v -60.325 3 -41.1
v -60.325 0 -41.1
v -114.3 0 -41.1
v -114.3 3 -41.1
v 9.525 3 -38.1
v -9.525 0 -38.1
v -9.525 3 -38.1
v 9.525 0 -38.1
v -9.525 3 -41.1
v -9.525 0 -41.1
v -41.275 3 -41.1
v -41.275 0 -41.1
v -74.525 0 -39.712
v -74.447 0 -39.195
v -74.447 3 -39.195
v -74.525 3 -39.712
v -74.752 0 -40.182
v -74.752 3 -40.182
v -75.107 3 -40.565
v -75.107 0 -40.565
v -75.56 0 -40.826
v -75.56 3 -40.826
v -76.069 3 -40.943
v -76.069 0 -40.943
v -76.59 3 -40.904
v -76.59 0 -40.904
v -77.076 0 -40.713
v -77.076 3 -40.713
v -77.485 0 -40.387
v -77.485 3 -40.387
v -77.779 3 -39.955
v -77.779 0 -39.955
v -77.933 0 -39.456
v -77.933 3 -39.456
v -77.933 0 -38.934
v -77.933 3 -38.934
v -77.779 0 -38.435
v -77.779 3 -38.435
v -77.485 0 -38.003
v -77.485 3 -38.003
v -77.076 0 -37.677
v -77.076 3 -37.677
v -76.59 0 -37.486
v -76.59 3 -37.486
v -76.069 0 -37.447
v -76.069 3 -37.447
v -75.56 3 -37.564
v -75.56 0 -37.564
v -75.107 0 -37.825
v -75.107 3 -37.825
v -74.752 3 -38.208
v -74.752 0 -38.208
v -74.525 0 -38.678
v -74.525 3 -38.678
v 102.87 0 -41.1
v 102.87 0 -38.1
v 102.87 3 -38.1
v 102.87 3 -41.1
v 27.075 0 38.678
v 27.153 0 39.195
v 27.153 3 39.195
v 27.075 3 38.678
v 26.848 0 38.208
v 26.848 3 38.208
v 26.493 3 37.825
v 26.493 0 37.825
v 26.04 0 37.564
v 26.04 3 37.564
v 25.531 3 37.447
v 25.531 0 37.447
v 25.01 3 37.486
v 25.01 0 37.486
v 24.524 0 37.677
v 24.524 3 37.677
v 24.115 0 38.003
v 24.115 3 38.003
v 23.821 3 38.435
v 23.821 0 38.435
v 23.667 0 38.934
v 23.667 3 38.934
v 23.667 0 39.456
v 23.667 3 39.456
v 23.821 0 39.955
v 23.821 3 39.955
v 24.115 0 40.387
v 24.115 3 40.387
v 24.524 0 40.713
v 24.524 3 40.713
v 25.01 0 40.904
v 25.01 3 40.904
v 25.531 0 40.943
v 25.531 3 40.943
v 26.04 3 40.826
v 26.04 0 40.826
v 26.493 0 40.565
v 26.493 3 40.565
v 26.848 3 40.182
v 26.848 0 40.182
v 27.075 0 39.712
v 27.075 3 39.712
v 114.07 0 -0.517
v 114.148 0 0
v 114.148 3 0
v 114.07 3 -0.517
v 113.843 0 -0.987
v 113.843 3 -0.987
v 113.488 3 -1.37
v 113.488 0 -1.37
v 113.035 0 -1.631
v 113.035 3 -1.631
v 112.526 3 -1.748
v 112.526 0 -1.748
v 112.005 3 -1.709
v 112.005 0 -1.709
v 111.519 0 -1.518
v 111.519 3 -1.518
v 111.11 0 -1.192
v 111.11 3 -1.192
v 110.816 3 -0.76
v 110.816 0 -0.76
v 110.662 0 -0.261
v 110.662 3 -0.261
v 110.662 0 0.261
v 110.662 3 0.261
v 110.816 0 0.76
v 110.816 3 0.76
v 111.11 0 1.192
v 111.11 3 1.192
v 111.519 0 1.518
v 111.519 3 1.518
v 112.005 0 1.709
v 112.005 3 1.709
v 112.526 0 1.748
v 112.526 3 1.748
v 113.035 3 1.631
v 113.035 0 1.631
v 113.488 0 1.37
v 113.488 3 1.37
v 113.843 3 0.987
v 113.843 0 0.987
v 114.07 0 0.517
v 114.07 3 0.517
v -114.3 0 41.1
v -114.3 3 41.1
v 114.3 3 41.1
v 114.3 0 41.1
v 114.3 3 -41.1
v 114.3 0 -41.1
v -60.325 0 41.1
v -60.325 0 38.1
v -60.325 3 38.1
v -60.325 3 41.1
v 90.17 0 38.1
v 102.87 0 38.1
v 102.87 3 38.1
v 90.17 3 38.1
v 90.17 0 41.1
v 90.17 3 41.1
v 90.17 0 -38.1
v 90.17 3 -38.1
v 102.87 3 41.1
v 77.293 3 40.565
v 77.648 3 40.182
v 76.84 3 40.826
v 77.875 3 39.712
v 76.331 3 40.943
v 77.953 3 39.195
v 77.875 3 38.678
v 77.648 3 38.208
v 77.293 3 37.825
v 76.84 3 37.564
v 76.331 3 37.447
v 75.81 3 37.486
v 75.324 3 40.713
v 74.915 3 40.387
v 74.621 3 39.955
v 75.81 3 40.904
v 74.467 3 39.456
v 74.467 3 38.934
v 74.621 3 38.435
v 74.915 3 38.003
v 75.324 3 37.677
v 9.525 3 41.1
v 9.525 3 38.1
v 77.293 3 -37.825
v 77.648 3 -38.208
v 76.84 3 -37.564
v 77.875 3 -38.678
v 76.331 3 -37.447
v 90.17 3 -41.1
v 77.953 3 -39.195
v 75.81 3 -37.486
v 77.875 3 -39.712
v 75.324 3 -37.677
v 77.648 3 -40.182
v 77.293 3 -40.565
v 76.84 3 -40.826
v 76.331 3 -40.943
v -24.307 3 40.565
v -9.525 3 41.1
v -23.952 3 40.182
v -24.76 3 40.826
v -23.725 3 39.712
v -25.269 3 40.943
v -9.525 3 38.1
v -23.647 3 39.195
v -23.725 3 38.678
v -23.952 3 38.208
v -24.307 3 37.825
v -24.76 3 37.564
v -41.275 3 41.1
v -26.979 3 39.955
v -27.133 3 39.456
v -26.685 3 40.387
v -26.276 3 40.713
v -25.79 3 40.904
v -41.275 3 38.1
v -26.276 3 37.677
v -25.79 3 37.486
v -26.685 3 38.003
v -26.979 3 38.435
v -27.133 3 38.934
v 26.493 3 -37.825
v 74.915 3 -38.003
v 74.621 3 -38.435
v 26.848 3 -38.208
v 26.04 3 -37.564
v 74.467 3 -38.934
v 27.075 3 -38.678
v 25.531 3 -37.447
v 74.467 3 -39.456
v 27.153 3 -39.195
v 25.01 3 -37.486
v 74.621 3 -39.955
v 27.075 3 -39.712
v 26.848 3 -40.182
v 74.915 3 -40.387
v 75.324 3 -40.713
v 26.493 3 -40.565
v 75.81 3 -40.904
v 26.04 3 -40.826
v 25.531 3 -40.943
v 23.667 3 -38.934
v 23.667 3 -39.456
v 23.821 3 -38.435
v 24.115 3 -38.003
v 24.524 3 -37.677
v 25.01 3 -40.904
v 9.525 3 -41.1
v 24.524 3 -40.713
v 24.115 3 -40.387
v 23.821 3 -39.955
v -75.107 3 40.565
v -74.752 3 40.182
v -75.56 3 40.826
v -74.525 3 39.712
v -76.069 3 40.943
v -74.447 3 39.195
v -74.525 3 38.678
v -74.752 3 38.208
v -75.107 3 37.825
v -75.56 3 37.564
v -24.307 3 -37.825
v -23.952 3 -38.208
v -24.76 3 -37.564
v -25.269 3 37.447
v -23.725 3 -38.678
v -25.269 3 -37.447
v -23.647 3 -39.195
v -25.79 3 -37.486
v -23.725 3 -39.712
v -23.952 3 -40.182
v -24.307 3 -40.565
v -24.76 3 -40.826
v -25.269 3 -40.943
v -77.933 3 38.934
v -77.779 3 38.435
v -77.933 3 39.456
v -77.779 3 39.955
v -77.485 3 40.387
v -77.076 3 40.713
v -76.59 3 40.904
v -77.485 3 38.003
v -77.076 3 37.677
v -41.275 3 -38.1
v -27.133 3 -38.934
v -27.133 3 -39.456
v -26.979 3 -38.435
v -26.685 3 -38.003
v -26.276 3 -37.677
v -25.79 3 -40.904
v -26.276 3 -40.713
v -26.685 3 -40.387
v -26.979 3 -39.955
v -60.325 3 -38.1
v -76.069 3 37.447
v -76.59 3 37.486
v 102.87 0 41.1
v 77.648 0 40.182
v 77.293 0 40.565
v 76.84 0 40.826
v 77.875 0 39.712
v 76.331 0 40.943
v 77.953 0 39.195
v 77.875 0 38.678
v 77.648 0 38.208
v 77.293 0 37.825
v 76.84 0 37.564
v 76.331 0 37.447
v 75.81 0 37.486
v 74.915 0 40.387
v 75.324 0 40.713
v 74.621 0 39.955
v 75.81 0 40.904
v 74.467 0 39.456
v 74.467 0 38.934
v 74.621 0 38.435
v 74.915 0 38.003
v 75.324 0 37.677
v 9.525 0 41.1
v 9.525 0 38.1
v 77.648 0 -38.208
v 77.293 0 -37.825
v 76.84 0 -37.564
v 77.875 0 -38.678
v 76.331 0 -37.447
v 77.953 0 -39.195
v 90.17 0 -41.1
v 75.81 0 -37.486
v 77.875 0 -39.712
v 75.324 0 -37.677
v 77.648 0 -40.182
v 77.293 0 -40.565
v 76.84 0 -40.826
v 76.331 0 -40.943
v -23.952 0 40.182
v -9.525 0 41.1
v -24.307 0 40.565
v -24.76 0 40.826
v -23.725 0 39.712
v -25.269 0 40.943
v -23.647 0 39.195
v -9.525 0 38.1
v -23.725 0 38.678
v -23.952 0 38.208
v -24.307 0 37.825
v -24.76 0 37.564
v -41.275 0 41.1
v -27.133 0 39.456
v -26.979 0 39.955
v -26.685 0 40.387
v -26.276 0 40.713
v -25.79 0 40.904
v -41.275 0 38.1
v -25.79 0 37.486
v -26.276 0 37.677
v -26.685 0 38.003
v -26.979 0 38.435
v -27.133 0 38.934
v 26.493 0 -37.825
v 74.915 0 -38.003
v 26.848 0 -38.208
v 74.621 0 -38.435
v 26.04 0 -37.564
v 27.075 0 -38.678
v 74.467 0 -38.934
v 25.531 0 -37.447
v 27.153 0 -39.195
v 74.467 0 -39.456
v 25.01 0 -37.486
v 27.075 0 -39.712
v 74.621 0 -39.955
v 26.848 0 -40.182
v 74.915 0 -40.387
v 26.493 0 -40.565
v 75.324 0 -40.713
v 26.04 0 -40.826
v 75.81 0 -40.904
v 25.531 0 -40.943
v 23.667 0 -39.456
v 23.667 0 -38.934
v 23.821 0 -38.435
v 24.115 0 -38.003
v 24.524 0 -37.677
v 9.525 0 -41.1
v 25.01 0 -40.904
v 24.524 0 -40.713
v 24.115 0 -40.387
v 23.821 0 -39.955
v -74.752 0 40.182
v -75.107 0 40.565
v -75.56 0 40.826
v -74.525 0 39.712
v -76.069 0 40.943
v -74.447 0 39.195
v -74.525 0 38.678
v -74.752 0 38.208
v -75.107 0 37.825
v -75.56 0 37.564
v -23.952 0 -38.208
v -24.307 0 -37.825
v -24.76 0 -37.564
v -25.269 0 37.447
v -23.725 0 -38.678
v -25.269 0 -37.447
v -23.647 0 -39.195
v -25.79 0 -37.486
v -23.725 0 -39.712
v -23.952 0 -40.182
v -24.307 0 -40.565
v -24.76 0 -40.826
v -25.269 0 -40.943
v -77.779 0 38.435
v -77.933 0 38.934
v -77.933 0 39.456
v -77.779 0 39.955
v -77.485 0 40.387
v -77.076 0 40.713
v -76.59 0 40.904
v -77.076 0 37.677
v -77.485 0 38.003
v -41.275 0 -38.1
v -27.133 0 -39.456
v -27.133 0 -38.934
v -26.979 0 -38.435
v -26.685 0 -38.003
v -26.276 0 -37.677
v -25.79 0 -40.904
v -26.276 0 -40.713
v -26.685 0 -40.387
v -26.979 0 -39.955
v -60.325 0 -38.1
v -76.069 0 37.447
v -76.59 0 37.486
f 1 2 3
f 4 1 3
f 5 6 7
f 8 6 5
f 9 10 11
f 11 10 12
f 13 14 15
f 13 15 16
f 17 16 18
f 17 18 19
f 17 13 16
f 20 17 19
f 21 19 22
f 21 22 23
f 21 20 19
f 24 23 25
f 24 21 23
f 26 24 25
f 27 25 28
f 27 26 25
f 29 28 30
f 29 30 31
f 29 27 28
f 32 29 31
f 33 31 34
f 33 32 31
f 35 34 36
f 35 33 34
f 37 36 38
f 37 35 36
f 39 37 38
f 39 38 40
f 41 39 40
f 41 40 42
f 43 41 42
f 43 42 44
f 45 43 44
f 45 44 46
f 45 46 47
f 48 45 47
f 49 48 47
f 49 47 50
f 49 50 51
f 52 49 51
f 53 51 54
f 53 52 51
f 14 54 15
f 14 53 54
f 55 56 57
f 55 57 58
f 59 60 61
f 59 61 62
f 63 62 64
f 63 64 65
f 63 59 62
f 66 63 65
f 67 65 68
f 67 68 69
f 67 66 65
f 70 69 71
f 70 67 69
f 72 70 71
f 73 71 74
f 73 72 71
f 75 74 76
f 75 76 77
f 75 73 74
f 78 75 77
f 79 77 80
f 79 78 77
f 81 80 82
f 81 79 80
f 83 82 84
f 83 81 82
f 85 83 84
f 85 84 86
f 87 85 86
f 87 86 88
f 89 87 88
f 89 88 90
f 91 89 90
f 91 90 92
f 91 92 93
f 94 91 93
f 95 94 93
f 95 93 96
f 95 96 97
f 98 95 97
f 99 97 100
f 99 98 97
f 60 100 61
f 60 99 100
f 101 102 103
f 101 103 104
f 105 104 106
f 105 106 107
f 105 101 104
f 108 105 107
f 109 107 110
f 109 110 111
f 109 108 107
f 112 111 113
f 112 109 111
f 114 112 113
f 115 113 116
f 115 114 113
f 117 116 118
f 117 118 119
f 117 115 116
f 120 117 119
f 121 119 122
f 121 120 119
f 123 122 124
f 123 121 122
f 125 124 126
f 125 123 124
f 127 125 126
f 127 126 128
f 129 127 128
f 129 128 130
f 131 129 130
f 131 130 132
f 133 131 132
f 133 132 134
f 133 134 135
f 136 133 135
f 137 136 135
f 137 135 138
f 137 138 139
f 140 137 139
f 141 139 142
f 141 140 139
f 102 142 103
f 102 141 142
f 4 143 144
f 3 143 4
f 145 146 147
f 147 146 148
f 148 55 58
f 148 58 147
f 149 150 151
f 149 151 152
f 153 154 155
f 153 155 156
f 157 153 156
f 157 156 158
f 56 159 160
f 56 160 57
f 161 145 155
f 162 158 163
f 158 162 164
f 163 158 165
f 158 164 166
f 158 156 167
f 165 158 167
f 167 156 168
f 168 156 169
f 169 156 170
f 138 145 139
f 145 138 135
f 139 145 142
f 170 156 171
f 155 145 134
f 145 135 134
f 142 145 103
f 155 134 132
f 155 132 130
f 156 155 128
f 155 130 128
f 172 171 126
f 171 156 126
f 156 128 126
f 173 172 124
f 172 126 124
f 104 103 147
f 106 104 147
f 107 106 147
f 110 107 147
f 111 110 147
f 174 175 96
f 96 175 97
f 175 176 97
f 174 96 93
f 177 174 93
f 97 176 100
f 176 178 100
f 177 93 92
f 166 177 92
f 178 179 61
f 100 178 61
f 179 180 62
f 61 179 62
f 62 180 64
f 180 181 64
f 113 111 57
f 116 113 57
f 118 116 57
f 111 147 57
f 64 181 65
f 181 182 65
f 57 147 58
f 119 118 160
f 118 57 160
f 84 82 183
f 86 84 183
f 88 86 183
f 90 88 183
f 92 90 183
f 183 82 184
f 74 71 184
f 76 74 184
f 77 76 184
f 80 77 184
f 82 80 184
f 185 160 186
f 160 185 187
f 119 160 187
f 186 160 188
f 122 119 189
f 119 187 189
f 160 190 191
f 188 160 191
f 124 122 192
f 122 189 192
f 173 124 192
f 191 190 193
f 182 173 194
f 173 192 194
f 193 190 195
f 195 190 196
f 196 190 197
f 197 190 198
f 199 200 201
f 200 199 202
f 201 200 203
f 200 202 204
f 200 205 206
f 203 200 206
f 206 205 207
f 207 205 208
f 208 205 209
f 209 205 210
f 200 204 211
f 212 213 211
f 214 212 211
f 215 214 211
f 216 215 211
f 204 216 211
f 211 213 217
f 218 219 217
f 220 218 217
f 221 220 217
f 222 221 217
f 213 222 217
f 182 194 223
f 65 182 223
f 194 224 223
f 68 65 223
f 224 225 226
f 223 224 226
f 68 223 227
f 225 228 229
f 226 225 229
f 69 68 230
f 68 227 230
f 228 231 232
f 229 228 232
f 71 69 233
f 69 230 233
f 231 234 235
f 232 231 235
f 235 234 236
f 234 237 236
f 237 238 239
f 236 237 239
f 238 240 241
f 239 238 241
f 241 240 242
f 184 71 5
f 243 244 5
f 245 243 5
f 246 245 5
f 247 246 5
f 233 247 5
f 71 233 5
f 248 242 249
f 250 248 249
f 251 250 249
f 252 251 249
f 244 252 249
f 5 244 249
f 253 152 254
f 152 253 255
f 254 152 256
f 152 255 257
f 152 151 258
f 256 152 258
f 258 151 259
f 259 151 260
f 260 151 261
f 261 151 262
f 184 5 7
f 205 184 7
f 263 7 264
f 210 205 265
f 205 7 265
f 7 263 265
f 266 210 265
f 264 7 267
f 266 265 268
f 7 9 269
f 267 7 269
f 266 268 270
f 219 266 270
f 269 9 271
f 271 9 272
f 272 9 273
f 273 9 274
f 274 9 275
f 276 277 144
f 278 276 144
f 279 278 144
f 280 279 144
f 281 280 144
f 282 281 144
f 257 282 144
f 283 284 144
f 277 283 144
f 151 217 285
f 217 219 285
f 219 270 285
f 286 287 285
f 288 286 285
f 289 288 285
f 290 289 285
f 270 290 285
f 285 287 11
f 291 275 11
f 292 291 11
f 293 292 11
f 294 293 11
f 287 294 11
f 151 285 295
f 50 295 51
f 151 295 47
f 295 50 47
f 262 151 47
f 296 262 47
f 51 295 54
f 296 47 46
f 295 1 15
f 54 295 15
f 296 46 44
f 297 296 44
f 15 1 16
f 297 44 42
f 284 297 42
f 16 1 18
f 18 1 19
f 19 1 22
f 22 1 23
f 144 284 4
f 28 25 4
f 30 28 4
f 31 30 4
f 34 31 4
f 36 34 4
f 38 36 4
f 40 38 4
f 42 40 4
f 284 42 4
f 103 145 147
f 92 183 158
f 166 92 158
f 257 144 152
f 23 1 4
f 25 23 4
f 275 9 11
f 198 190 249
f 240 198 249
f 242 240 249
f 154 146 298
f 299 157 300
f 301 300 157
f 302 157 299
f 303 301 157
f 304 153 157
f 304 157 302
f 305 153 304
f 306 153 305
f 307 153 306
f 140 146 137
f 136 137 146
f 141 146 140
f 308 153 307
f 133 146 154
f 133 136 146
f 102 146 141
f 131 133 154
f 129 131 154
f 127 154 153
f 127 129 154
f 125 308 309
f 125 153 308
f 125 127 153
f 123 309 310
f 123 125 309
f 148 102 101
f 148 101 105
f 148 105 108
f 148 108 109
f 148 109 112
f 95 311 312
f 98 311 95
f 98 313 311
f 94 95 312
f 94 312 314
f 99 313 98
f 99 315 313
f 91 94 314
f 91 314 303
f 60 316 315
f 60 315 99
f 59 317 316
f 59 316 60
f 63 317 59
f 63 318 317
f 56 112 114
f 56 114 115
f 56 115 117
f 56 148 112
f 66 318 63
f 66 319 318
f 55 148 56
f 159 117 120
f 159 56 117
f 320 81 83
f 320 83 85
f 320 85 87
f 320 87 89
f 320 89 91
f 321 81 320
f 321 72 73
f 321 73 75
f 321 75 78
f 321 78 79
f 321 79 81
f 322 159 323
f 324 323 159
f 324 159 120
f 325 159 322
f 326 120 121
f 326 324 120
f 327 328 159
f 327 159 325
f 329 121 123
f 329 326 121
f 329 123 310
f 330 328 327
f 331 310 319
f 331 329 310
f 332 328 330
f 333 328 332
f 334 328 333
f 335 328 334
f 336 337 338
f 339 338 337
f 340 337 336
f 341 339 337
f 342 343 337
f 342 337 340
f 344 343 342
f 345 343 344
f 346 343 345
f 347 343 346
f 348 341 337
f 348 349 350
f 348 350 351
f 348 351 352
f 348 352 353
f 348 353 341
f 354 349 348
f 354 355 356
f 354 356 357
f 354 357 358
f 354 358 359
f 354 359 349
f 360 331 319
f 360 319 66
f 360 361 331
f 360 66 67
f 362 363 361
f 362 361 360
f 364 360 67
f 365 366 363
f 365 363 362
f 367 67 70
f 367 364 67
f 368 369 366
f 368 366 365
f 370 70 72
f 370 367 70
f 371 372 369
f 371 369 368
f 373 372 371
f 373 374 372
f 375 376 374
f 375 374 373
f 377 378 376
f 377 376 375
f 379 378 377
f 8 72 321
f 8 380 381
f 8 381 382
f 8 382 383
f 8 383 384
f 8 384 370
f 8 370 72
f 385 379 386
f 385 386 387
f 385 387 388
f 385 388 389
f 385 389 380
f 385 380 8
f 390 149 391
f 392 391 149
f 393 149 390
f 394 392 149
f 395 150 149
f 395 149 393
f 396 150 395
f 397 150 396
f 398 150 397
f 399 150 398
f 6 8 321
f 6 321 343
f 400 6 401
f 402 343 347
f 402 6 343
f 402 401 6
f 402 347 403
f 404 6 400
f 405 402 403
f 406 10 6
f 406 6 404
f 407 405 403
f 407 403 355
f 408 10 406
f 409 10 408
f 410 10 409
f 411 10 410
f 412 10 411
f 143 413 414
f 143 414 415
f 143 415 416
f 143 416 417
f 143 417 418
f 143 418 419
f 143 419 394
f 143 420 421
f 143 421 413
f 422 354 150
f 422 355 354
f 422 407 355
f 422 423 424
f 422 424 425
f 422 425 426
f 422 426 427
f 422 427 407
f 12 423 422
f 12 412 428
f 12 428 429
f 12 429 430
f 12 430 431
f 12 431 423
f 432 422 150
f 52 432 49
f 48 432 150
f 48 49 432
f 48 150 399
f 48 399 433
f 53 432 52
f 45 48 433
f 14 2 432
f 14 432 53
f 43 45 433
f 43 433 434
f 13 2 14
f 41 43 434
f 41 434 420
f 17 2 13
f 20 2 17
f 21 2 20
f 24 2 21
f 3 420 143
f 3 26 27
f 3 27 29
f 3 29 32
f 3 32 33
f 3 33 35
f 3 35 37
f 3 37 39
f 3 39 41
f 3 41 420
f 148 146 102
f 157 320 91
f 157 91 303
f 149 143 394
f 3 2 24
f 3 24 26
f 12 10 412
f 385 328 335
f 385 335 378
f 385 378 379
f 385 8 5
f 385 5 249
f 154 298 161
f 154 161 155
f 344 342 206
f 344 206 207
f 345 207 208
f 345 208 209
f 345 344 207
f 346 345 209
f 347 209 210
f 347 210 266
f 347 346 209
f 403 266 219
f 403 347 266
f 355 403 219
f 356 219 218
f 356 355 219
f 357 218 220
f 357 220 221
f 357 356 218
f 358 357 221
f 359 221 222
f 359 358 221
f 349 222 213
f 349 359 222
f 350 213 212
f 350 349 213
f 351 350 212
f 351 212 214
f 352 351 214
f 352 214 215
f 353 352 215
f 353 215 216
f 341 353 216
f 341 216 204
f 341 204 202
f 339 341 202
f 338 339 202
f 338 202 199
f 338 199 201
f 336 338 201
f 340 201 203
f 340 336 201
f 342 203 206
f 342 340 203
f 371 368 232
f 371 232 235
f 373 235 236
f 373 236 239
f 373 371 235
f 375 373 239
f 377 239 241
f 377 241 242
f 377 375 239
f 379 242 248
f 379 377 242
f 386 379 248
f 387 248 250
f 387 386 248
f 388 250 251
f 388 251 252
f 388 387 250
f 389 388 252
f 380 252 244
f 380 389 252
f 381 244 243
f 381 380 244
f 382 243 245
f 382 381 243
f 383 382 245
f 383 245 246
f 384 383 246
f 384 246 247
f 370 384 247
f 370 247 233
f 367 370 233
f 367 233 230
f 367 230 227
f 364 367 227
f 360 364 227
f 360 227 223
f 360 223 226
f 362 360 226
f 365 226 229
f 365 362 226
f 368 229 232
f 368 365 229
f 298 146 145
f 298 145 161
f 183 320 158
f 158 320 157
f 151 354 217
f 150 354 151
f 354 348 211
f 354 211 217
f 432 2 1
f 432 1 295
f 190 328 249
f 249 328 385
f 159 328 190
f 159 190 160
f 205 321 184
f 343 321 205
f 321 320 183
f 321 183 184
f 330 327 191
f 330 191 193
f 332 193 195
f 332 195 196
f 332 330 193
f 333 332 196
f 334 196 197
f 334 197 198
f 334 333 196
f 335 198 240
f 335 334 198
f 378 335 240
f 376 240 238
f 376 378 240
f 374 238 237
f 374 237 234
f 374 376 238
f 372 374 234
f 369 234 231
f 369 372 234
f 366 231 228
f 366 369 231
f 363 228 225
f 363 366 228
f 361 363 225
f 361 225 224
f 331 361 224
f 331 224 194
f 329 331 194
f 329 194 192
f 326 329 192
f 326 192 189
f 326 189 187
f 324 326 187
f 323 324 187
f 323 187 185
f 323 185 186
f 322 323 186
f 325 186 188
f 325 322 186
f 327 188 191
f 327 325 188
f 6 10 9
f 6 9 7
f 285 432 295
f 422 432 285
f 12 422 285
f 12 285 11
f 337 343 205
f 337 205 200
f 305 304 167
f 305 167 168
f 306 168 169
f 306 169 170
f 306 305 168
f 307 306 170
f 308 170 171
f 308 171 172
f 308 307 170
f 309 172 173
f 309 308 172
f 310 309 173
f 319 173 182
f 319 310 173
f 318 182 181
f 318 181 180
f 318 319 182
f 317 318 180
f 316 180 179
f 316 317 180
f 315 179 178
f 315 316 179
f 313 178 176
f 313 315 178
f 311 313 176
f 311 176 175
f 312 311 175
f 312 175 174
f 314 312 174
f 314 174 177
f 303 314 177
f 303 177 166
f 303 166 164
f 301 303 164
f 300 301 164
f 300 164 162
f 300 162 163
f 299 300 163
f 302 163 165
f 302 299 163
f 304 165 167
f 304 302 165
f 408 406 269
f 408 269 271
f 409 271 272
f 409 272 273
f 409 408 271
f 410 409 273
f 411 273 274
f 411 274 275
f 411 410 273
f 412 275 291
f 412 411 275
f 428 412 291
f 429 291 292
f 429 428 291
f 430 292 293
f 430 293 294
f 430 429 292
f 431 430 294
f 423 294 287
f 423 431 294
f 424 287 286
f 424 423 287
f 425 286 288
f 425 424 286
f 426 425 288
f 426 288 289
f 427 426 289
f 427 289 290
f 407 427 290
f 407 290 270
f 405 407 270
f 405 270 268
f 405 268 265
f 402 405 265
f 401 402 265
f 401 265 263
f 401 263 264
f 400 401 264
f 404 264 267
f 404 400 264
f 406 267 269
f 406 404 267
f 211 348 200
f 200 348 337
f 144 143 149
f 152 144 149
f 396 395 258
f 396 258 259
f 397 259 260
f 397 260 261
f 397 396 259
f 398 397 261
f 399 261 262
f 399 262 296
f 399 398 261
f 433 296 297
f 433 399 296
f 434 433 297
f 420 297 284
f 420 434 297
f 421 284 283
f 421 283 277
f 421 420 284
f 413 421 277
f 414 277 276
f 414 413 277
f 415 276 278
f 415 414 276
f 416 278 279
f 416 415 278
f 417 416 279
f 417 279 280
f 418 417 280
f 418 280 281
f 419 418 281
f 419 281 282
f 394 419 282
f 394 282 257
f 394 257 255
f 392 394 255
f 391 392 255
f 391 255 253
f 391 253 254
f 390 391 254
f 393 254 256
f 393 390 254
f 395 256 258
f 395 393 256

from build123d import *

# Parameters (mm, degrees)
SKETCH1_R           = 1.7526
BOSS_EXTRUDE1_DEPTH = 3


with BuildPart() as part:
    # Sketch1 → Boss-Extrude1 (new body)
    with BuildSketch(Plane(origin=(0, 0, 0), x_dir=(1, 0, 0), z_dir=(0, 1, 0))):
        Polygon((114.3, -0.83215209), (114.3, -41.1), (102.87, -41.1), (102.87, -38.1), (90.17, -38.1), (90.17, -41.1), (89.493211941, -41.1), (77.528882775, -41.1), (74.871117225, -41.1), (26.728882775, -41.1), (24.071117225, -41.1), (9.525, -41.1), (9.525, -38.1), (-9.525, -38.1), (-9.525, -41.1), (-24.071117225, -41.1), (-26.728882775, -41.1), (-41.275, -41.1), (-41.275, -38.1), (-60.325, -38.1), (-60.325, -41.1), (-74.871117225, -41.1), (-77.528882775, -41.1), (-114.3, -41.1), (-114.3, 41.1), (-77.528882775, 41.1), (-74.871117225, 41.1), (-60.325, 41.1), (-60.325, 38.1), (-41.275, 38.1), (-41.275, 41.1), (-26.728882775, 41.1), (-24.071117225, 41.1), (-9.525, 41.1), (-9.525, 38.1), (9.525, 38.1), (9.525, 41.1), (24.071117225, 41.1), (26.728882775, 41.1), (74.871117225, 41.1), (77.528882775, 41.1), (89.493211941, 41.1), (90.17, 41.1), (90.17, 38.1), (102.87, 38.1), (102.87, 41.1), (114.3, 41.1), (114.3, 1.18215209), align=None)
        with Locations((-25.4, -39.195)):
            Circle(SKETCH1_R, mode=Mode.SUBTRACT)
        with Locations((112.395, 0)):
            Circle(SKETCH1_R, mode=Mode.SUBTRACT)
        with Locations((25.4, -39.195)):
            Circle(SKETCH1_R, mode=Mode.SUBTRACT)
        with Locations((76.2, -39.195)):
            Circle(SKETCH1_R, mode=Mode.SUBTRACT)
        with Locations((76.2, 39.195)):
            Circle(SKETCH1_R, mode=Mode.SUBTRACT)
        with Locations((25.4, 39.195)):
            Circle(SKETCH1_R, mode=Mode.SUBTRACT)
        with Locations((-25.4, 39.195)):
            Circle(SKETCH1_R, mode=Mode.SUBTRACT)
        with Locations((-76.2, 39.195)):
            Circle(SKETCH1_R, mode=Mode.SUBTRACT)
        with Locations((-76.2, -39.195)):
            Circle(SKETCH1_R, mode=Mode.SUBTRACT)
    extrude(amount=BOSS_EXTRUDE1_DEPTH)


solid = part.part
